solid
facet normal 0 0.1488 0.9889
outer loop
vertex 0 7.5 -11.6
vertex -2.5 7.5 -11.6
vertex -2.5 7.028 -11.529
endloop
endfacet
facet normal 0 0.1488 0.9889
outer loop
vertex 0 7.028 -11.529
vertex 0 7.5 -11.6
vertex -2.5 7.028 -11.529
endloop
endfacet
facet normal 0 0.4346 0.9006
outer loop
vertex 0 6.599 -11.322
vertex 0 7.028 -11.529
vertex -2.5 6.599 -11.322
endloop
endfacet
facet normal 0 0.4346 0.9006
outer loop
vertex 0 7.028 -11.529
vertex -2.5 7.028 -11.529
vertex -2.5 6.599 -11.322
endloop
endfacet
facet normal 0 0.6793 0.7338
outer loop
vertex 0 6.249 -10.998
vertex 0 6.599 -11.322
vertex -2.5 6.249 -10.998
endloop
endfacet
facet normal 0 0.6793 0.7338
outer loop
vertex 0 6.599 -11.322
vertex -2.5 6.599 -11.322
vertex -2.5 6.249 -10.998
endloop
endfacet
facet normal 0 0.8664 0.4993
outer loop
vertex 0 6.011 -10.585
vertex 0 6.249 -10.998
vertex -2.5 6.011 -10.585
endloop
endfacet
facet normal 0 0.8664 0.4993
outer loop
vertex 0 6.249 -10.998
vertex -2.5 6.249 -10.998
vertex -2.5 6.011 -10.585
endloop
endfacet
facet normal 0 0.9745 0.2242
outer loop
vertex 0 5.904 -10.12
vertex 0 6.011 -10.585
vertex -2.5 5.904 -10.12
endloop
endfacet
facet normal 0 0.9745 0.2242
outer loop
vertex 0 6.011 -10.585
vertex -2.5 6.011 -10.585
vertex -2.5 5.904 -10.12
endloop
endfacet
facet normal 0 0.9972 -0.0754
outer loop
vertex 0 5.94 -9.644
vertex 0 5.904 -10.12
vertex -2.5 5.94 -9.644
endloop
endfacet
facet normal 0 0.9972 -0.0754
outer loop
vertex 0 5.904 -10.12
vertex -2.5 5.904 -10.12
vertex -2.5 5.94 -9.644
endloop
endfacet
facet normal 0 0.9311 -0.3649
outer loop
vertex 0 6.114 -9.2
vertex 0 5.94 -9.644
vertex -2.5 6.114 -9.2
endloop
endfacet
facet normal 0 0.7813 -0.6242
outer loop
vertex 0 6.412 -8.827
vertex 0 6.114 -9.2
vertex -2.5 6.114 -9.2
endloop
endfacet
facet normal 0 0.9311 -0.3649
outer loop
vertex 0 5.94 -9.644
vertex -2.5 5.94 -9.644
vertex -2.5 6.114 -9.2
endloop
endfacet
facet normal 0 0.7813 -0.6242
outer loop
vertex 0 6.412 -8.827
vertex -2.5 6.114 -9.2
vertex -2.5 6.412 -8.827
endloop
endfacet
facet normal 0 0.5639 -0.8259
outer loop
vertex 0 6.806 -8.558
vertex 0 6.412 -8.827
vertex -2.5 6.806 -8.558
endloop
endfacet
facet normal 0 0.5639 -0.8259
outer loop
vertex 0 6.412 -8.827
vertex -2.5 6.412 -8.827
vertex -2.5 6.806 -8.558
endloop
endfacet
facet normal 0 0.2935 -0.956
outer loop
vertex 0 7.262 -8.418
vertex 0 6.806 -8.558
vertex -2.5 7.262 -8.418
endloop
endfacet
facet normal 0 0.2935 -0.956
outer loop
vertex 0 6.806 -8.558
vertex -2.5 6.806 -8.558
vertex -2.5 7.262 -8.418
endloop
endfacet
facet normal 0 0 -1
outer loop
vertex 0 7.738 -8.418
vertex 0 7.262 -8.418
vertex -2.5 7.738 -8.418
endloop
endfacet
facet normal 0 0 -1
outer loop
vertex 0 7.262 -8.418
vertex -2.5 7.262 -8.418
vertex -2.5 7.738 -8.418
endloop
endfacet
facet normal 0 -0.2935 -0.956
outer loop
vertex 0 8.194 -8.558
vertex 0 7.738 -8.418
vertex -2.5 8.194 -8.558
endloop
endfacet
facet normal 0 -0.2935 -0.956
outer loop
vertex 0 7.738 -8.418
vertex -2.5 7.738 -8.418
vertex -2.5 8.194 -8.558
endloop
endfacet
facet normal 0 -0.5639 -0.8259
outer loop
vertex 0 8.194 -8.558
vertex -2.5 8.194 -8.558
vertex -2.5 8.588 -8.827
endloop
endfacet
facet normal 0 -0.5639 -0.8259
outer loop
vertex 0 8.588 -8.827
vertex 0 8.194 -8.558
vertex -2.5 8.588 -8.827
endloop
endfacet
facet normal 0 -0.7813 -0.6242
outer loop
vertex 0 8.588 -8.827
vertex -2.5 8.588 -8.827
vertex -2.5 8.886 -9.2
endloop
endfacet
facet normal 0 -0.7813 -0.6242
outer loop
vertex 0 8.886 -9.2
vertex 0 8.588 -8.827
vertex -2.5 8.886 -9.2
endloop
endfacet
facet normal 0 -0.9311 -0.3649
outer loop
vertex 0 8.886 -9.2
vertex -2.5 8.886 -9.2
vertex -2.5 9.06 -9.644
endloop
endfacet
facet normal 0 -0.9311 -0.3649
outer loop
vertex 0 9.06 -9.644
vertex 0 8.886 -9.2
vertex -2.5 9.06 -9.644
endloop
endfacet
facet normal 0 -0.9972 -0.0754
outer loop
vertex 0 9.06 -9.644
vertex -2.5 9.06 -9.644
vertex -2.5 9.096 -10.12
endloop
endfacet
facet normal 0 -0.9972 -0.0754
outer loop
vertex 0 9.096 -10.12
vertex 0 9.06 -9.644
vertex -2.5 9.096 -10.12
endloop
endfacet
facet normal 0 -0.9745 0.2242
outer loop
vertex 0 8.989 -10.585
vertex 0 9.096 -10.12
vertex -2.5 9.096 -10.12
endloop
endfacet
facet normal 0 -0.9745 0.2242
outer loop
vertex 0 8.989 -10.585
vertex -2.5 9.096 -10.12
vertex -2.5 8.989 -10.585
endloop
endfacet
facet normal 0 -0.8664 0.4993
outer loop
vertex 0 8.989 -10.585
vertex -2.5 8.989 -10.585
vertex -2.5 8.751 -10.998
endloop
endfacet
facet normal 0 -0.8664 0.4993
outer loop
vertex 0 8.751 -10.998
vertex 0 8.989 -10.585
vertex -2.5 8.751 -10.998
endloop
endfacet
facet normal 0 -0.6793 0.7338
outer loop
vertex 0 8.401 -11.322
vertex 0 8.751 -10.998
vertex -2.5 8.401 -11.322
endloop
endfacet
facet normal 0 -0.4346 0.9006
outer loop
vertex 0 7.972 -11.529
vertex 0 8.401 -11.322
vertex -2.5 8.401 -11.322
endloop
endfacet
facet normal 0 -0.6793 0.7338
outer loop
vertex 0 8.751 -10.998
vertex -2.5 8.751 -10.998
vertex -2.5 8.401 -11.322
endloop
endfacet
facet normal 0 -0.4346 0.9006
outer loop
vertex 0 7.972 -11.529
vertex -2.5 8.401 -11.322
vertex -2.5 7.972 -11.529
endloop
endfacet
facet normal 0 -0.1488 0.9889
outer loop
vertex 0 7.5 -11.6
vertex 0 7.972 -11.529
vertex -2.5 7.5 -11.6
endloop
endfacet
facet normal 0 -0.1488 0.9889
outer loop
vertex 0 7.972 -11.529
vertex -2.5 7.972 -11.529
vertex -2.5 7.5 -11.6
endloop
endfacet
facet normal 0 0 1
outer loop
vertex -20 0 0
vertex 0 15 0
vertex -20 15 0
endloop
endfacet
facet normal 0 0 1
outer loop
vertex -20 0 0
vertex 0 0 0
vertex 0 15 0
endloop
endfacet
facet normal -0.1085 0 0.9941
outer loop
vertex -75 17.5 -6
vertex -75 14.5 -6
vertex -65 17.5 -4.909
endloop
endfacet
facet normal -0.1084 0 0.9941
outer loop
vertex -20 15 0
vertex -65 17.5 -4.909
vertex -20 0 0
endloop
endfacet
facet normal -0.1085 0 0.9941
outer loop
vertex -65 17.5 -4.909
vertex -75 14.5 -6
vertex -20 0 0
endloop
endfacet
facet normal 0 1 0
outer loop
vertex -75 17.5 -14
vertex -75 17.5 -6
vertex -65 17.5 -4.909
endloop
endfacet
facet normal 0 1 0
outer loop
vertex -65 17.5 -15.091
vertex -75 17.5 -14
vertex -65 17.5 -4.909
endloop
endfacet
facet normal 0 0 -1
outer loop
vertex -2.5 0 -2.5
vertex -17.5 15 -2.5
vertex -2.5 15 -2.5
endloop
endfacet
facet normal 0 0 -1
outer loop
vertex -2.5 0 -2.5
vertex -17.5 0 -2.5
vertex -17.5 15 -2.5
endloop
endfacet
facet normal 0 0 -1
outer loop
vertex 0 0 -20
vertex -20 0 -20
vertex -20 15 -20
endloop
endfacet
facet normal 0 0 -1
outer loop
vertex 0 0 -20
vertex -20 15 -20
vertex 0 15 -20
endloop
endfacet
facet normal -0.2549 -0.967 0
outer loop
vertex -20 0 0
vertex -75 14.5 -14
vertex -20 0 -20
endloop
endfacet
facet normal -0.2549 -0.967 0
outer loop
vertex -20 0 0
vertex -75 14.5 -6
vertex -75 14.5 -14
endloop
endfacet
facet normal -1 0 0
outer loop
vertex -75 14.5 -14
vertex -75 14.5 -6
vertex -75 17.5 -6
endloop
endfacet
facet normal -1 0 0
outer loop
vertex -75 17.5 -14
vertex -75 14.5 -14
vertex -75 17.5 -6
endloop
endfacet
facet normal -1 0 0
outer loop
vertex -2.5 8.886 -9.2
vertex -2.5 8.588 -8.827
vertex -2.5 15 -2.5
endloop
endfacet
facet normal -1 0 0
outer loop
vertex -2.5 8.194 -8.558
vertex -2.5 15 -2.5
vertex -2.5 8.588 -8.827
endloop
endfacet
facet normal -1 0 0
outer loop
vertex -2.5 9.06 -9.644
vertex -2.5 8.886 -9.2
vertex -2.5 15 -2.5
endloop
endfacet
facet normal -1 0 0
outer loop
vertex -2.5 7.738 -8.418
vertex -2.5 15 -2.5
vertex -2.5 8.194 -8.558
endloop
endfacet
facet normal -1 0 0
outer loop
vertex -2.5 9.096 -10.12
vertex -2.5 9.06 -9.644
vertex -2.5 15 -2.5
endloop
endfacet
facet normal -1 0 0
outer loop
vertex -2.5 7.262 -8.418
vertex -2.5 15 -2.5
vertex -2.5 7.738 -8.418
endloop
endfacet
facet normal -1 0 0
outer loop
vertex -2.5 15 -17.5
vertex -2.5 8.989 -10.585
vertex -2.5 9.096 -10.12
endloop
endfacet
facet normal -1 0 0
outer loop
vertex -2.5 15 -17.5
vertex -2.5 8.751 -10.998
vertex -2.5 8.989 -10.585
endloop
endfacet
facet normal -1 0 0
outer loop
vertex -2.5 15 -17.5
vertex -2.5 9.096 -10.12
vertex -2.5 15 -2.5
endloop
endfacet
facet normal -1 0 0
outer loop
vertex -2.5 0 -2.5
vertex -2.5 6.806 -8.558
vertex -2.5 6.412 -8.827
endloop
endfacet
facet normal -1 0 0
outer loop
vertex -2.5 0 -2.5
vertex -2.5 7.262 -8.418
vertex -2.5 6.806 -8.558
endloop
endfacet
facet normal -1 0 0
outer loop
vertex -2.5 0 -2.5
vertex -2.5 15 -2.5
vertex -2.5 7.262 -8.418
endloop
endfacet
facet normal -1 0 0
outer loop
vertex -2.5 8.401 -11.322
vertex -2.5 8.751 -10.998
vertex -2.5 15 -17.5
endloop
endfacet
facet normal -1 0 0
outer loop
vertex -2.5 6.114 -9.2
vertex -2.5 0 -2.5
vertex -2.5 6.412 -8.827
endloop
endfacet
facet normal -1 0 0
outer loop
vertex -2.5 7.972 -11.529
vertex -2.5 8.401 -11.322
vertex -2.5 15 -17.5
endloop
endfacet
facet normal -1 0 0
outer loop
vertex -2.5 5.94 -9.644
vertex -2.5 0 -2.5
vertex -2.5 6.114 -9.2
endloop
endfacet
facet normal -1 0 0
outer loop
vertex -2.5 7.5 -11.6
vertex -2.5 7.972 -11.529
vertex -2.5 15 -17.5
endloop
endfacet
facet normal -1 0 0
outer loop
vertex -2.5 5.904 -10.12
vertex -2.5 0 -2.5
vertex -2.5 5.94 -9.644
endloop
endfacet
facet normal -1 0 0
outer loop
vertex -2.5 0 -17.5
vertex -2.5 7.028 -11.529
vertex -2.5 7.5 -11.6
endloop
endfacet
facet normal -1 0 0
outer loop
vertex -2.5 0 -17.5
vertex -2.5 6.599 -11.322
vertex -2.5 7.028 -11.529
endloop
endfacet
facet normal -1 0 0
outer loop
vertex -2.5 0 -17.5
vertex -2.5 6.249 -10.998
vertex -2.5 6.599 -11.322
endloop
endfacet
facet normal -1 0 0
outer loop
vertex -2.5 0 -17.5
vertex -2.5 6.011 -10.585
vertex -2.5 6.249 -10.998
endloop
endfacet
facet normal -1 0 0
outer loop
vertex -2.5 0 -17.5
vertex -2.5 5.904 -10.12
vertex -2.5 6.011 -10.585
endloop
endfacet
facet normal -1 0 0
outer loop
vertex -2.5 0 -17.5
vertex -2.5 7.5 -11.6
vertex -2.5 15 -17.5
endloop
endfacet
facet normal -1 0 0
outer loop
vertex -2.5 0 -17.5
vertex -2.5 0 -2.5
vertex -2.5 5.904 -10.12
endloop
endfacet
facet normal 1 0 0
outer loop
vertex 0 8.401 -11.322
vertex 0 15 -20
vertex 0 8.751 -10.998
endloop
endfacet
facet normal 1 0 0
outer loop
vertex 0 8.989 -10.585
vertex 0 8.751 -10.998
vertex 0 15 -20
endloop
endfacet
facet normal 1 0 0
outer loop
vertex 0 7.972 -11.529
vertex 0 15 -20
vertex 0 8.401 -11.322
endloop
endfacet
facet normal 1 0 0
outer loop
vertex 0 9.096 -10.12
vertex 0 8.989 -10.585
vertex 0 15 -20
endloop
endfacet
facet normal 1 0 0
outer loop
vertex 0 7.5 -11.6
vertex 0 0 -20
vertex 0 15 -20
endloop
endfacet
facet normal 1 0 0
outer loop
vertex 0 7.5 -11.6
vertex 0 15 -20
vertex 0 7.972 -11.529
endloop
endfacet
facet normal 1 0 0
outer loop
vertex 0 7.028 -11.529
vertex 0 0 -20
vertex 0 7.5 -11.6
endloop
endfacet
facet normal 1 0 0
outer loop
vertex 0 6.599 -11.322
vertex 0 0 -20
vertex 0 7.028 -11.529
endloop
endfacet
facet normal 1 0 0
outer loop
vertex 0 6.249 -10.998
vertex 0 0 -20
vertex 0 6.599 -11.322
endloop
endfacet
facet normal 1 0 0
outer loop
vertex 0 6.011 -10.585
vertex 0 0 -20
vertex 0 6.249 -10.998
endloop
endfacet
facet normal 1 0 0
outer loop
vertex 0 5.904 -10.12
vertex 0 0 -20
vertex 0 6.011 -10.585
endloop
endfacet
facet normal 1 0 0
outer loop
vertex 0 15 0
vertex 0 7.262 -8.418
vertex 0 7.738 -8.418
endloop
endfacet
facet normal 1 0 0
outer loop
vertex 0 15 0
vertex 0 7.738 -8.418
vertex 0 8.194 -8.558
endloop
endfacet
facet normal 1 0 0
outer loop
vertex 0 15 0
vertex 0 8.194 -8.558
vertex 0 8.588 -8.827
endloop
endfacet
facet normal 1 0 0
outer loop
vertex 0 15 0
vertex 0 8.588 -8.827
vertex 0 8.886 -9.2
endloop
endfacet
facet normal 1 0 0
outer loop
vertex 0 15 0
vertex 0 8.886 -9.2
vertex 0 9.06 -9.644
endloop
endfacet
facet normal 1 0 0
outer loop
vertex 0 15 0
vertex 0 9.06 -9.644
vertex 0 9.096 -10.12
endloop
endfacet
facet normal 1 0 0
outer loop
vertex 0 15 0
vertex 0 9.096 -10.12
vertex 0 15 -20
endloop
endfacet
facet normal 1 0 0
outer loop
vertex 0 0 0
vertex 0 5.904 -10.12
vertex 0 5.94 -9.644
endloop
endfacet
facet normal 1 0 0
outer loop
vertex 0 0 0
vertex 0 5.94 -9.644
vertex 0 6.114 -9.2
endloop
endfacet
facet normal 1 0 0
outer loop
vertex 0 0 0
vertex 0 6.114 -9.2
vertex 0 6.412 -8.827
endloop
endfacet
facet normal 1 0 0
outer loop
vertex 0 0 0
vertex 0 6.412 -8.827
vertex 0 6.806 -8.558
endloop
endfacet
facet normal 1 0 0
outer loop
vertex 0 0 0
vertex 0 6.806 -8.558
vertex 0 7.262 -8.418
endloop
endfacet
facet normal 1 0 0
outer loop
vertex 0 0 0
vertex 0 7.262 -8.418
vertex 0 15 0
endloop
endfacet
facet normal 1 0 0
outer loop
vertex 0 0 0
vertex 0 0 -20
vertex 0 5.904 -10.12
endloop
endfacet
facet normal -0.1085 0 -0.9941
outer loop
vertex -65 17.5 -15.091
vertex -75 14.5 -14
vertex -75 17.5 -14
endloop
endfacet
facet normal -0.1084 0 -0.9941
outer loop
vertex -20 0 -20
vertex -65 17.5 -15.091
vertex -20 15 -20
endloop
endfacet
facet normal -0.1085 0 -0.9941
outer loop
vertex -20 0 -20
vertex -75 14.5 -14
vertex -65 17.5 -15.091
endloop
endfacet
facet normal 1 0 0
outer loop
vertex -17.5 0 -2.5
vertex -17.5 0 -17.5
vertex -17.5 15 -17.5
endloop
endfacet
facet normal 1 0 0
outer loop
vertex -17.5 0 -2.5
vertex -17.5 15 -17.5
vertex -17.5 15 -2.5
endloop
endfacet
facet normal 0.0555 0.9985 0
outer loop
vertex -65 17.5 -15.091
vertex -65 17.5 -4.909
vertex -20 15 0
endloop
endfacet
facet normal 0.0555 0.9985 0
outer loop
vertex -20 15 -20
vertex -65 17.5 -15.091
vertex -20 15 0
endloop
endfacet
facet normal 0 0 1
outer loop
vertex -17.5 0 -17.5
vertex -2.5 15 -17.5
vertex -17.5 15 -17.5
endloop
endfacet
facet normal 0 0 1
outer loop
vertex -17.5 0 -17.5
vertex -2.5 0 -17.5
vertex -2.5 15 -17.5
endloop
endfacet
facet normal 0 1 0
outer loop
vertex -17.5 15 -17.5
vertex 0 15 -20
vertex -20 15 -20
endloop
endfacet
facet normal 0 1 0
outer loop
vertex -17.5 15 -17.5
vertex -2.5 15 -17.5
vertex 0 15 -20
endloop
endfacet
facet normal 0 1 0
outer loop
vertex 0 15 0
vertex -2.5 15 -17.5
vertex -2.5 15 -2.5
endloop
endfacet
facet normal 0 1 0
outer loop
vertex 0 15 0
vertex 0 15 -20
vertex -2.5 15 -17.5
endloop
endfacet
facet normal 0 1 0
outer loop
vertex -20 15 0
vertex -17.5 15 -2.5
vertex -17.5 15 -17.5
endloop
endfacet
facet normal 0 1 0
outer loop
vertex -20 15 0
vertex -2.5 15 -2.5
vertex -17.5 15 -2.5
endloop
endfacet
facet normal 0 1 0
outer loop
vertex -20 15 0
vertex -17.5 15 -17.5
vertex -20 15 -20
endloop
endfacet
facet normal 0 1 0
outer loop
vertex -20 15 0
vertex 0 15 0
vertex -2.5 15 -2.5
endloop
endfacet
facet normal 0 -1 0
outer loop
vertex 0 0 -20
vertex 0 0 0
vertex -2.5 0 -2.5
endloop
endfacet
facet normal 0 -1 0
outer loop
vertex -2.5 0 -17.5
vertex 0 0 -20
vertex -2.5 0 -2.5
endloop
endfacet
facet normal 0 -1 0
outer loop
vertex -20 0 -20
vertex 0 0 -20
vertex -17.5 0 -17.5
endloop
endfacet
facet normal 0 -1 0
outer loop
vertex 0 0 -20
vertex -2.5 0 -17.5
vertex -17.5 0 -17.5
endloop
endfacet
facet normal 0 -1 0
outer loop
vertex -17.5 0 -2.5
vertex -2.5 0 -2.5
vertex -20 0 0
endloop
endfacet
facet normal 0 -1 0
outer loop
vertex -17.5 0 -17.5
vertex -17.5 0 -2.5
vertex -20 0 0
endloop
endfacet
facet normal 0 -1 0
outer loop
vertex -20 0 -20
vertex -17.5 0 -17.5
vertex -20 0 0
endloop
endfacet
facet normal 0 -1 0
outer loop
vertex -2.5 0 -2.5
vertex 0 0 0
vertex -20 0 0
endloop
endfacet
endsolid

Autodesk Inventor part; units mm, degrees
ref_plane "YZ Plane" through (0, 0, 0) normal (1, 0, 0) x (0, 1, 0)
ref_plane "XZ Plane" through (0, 0, 0) normal (0, 1, 0) x (-1, 0, 0)
ref_plane "XY Plane" through (0, 0, 0) normal (0, 0, 1) x (1, 0, 0)
sketch "スケッチ1" plane through (0, 0, 0) normal (0, 1, 0) x (-1, 0, 0)
  line L0 (0, 0) -> (20, 0)
  line L1 (20, 0) -> (20, -20)
  line L2 (20, -20) -> (0, -20)
  line L3 (0, -20) -> (0, 0)
  line L4 (17.5, -2.5) -> (2.5, -2.5)
  line L5 (2.5, -2.5) -> (2.5, -17.5)
  line L6 (2.5, -17.5) -> (17.5, -17.5)
  line L7 (17.5, -17.5) -> (17.5, -2.5)
  dimension "d0" = 20
  dimension "d1" = 20
  dimension "d2" = 15
  dimension "d3" = 15
  dimension "d4" = 2.5
  dimension "d5" = 2.5
extrude "押し出し1" add sketch "スケッチ1" along normal blind 15
sketch "スケッチ2" plane through (-20, 0, 0) normal (0, 0, 1) x (1, 0, 0)
  line L0 (20, 0) -> (-55, 0)
  line L1 (-55, 0) -> (-55, 17.5)
  line L2 (-55, 17.5) -> (20, 17.5)
  line L3 (20, 17.5) -> (20, 0)
  line L4 (-55, 17.5) -> (-45, 17.5)
  line L5 (-45, 17.5) -> (-45, 14.5)
  line L6 (-45, 14.5) -> (-55, 14.5)
  line L7 (-55, 14.5) -> (-55, 17.5)
  line L8 (0, 0) -> (0, 15) projected
  line L9 (-55, 14.5) -> (0, 0)
  line L10 (-45, 17.5) -> (0, 15)
  point P0 (-45, 17.5)
  dimension "d8" = 75
  dimension "d9" = 17.5
  dimension "d10" = 10
  dimension "d11" = 3
extrude "押し出し2" add sketch "スケッチ2" against normal blind 20 contours L9 L6 L5 L10 L8 | L1 L2 L5 L6
sketch "スケッチ3" plane through (0, 0, 0) normal (0, -1, 0) x (1, 0, 0)
  line L0 (-75, 0) -> (-75, -20) projected
  line L1 (0, 0) -> (0, -20) projected
  line L2 (-75, -14) -> (0, -14)
  line L3 (0, -14) -> (0, -6)
  line L4 (0, -6) -> (-75, -6)
  line L5 (-75, -6) -> (-75, -14)
  line L6 (-20, -20) -> (-75, -20) projected
  line L7 (-75, -14) -> (-20, -20)
  line L8 (-20, 0) -> (0, 0) projected
  line L9 (-75, -6) -> (-20, 0)
  line L10 (-75, -20) -> (-20, -20)
  line L11 (-20, -20) -> (-20, 0)
  line L12 (-20, 0) -> (-75, 0)
  line L13 (-75, 0) -> (-75, -20)
  dimension "d14" = 8
  dimension "d15" = 6
extrude "押し出し3" cut sketch "スケッチ3" against normal through all contours L12 L9 L0 | L7 L6 L0
sketch "スケッチ4" plane through (0, 0, 0) normal (1, 0, 0) x (0, 0, -1)
  line L0 (0, 0) -> (0, 15) projected
  line L1 (0, 7.5) -> (20, 7.5)
  line L2 (20, 0) -> (20, 15) projected
  point P0 (10, 7.5)
hole "穴1" at (0, 7.5, -10) direction (-1, 0, 0) diameter 3.2 depth 8 tip angle 118
properties part number "endeff_3dp4" material "ABS プラスチック"
